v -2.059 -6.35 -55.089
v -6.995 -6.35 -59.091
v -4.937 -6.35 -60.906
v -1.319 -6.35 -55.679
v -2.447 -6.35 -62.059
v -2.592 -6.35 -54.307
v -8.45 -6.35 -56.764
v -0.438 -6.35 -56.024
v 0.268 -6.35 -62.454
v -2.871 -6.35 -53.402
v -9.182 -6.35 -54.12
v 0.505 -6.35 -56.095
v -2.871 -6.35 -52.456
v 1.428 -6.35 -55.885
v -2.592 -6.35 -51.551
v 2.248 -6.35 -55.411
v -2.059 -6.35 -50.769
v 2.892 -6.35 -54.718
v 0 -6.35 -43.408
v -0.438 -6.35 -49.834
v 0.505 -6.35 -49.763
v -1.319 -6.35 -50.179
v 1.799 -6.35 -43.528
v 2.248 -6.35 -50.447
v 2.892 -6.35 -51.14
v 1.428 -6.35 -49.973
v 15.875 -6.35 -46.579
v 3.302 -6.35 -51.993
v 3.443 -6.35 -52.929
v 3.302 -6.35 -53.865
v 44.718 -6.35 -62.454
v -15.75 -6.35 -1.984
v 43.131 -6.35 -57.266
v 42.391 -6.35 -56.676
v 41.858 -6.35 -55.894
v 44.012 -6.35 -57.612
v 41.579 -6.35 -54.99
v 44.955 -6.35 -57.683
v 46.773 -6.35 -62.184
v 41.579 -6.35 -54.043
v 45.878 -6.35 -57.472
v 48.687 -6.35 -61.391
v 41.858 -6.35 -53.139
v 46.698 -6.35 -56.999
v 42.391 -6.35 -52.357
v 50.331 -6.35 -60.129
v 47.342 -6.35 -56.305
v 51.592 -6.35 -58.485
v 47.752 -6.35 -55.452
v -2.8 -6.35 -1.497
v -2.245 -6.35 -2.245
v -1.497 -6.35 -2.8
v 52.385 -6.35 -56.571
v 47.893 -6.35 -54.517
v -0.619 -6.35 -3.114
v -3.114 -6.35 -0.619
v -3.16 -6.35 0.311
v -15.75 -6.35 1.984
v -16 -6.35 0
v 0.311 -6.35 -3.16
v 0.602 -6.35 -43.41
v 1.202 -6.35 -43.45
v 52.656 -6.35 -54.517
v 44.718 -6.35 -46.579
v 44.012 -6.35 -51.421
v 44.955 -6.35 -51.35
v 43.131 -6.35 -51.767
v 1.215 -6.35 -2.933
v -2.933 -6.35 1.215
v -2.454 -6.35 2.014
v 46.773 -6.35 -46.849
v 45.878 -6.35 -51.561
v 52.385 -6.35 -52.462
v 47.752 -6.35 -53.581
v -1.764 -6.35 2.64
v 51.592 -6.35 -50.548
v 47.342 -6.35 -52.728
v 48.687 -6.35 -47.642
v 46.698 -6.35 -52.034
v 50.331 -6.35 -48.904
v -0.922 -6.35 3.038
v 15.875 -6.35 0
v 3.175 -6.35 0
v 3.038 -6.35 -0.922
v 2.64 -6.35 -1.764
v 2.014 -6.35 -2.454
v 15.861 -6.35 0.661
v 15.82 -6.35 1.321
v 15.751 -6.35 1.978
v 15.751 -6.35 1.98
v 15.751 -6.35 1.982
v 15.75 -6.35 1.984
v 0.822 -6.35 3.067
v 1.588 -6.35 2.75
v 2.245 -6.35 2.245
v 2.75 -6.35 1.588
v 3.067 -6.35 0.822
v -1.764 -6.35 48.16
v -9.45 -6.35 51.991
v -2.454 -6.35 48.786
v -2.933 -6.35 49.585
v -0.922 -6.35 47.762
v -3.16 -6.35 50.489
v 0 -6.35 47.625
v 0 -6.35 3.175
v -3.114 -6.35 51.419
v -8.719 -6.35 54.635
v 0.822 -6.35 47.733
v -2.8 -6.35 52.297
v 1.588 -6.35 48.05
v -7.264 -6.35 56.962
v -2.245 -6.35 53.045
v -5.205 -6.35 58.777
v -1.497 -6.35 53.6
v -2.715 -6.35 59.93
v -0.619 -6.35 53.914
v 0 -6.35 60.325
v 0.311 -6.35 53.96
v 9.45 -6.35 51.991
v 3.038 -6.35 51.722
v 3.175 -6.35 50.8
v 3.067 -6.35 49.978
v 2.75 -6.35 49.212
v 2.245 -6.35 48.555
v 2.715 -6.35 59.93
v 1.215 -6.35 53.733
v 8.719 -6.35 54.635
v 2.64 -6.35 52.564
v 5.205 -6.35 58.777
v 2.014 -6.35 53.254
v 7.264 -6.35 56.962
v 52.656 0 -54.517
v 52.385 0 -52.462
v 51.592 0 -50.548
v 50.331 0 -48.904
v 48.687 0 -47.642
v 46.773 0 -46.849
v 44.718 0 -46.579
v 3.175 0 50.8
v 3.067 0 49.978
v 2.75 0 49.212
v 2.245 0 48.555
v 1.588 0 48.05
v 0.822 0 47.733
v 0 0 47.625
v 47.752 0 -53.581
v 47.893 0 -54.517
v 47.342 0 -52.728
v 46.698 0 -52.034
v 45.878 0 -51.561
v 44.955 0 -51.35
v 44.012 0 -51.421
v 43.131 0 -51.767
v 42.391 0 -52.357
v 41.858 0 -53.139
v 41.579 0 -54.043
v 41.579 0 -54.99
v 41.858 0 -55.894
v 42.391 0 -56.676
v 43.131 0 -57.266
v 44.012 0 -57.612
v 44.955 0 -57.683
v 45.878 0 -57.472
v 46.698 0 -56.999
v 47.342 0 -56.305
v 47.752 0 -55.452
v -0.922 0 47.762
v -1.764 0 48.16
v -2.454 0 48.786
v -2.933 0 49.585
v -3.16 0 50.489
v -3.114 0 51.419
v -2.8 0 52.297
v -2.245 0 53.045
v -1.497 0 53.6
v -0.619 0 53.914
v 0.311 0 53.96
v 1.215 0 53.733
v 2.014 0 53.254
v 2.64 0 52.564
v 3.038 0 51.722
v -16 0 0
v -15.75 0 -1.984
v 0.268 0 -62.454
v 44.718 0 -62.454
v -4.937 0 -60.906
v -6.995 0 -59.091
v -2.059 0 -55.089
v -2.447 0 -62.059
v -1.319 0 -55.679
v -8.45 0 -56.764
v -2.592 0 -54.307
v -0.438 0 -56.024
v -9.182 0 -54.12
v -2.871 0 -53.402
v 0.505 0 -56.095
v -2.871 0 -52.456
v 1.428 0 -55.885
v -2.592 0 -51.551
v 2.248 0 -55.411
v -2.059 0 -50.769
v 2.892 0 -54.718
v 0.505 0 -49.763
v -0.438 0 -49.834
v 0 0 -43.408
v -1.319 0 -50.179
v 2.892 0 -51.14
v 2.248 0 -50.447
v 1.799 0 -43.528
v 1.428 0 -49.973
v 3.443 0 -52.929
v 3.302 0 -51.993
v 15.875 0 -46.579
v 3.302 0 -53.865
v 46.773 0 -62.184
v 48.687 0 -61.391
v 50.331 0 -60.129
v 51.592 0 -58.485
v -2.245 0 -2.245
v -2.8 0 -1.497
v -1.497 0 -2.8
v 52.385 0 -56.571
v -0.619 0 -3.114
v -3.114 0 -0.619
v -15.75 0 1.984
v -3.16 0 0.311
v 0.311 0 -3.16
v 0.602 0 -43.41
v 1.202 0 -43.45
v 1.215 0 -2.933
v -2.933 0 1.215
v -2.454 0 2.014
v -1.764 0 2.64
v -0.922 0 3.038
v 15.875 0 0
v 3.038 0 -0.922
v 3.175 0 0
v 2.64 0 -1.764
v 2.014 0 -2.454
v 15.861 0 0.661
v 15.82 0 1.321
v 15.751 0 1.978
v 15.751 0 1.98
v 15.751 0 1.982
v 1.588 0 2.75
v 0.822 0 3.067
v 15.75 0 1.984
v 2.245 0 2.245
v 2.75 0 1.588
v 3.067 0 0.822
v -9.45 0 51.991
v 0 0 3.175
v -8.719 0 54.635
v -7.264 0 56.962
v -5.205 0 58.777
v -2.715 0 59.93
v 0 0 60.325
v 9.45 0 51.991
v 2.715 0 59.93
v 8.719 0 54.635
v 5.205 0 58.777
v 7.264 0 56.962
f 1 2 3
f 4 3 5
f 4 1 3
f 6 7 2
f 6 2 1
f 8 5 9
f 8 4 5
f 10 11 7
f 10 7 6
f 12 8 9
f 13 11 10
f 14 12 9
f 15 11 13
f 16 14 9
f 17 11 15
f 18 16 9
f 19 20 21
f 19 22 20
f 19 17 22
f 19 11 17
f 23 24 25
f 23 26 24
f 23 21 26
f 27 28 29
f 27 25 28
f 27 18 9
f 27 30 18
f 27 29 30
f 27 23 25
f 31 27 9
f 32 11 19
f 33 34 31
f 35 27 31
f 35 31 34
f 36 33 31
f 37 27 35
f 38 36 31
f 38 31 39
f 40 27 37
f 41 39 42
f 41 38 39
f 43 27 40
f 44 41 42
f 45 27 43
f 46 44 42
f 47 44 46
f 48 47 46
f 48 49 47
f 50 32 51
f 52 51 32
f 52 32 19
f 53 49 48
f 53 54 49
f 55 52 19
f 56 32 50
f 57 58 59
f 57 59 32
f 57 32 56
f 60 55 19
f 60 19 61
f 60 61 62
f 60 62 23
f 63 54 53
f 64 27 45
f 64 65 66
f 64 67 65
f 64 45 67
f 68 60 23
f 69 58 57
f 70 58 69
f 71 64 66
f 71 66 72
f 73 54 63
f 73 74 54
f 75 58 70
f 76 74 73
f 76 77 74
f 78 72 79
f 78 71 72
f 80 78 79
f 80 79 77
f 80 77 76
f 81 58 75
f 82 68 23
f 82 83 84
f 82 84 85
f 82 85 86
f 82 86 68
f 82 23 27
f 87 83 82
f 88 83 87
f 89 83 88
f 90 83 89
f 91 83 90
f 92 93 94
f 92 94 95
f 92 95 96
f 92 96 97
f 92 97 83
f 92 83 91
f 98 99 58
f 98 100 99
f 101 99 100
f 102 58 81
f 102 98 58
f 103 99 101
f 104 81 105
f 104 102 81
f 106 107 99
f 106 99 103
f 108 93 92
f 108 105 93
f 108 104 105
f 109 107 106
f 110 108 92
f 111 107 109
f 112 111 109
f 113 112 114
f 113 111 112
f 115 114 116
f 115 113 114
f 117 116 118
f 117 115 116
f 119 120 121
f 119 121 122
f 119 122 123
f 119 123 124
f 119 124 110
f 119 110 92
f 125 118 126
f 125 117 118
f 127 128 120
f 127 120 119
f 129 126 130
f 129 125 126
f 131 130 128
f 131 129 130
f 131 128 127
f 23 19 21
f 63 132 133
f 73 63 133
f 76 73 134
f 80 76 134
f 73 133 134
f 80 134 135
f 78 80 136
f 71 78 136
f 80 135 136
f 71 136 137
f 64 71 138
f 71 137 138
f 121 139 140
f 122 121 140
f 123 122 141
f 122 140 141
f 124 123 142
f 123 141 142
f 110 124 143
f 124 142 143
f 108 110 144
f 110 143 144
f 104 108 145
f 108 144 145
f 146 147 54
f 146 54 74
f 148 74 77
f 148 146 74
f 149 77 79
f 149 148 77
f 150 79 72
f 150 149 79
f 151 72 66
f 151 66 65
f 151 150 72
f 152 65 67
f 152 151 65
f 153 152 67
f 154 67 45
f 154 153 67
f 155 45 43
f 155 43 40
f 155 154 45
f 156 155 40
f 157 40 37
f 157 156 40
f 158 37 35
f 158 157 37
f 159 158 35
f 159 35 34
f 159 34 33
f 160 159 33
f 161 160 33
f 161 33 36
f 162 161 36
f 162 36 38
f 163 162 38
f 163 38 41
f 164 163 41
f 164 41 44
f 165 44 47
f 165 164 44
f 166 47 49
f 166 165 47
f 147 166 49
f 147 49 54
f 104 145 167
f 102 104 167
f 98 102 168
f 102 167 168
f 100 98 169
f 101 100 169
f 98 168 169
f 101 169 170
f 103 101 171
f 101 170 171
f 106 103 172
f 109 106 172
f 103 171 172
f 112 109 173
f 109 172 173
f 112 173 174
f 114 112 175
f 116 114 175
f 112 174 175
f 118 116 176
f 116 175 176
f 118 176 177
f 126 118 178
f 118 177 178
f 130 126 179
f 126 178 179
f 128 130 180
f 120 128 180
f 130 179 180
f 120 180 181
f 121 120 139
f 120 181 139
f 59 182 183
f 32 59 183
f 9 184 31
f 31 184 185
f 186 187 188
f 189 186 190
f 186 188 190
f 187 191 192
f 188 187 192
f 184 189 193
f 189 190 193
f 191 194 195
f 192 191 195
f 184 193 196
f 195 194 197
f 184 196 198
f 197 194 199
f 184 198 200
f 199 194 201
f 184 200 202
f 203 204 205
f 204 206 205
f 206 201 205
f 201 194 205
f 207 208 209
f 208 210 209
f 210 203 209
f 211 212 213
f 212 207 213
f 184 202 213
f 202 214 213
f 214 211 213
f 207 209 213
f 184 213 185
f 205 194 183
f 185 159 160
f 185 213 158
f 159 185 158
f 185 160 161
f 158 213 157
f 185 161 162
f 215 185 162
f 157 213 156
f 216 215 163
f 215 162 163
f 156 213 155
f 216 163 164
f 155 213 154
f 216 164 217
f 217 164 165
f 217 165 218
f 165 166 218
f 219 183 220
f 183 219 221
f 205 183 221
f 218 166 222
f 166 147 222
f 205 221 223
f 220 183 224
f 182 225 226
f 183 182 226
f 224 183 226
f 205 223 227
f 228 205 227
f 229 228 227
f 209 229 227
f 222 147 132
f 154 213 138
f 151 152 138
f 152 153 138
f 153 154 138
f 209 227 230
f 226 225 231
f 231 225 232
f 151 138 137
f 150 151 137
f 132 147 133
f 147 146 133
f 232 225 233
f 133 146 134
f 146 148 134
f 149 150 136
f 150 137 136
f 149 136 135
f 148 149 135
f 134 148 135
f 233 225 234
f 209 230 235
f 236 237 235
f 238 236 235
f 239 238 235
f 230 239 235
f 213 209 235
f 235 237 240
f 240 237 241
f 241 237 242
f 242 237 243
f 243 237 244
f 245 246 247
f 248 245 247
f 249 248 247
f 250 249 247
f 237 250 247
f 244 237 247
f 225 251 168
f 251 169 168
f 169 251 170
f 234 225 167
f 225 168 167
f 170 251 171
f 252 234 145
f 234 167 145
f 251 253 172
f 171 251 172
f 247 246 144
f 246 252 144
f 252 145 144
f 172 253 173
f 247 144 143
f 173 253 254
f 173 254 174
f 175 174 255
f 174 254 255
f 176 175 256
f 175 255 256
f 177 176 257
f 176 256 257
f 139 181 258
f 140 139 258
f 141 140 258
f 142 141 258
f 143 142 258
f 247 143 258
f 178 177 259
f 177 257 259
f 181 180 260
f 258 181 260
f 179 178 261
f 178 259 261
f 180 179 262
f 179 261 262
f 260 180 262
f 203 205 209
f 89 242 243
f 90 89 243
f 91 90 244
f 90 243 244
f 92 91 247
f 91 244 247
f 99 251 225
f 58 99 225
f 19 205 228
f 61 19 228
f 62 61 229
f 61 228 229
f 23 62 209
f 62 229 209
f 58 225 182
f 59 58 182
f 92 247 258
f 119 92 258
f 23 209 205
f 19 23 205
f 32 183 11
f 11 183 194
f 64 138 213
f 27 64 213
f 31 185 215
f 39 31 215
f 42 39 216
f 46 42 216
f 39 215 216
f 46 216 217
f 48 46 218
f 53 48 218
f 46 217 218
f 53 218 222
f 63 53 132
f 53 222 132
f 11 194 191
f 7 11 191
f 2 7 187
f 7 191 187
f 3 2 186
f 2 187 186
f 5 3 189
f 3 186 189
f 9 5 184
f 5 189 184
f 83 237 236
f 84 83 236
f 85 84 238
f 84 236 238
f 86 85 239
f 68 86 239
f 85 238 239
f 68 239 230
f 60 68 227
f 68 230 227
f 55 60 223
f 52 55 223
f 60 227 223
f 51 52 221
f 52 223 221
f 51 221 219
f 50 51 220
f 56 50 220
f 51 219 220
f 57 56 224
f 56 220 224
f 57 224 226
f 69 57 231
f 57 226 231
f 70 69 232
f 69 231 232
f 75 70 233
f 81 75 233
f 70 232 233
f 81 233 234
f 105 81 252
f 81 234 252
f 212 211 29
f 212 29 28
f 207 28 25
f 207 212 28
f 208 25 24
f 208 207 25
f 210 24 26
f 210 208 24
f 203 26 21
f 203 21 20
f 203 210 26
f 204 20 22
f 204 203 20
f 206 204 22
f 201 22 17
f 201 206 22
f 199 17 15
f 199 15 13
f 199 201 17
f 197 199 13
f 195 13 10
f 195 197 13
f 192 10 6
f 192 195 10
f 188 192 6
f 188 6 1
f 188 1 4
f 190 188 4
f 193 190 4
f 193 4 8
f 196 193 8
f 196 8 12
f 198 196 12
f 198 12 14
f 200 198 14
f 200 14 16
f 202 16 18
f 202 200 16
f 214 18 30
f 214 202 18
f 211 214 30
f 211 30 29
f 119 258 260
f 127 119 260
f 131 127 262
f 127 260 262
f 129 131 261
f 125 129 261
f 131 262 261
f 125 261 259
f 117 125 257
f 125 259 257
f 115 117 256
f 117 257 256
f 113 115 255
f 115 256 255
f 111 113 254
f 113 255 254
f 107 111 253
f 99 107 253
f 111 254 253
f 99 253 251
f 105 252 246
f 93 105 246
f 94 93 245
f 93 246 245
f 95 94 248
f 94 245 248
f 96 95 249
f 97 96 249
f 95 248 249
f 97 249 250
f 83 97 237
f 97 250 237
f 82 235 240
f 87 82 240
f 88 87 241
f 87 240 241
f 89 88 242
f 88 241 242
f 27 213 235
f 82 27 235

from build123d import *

# Parameters (mm, degrees)
F0_R     = 3.175
F1_DEPTH = 6.35


# Not quite as in the source:
# - the program builds the solid bodies; features that only make, move or delete a surface that nothing else refers to are left out


with BuildPart() as f1:
    # F0 (on Front) → F1 (new body)
    with BuildSketch(Plane.XZ):
        with BuildLine():
            ThreePointArc((15.7504882737, 1.984375), (10.5003255158, 11.90625), (0, 15.875))
            ThreePointArc((0, 15.875), (-10.500325544, 11.9062499751), (-15.7504882831, 1.9843749253))
            ThreePointArc((-15.7504882831, 1.9843749253), (-15.875, -5.44e-08), (-15.7504882695, -1.9843750333))
            ThreePointArc((-15.7504882695, -1.9843750333), (0.9941387534, -15.8438414893), (15.875, 0))
            ThreePointArc((15.875, 0), (15.8440389276, 0.9909871135), (15.7512764776, 1.9781087752))
            ThreePointArc((15.7512764776, 1.9781087752), (15.7508826872, 1.9812419268), (15.7504882737, 1.984375))
        make_face()
        with BuildLine():
            ThreePointArc((0, 3.175), (2.2450640303, 2.2450640303), (3.175, 0))
            ThreePointArc((3.175, 0), (-2.2450640303, -2.2450640303), (0, 3.175))
        make_face(mode=Mode.SUBTRACT)
        with BuildLine():
            ThreePointArc((-15.7504882831, 1.9843749253), (-10.500325544, 11.9062499751), (0, 15.875))
            Line((0, 15.875), (0, 41.275))
            ThreePointArc((0, 41.275), (-7.14375, 44.4998046905), (-9.4502929642, 51.990625))
            Line((-9.4502929642, 51.990625), (-15.7504882831, 1.9843749253))
        make_face()
        with BuildLine():
            Line((0, 41.275), (0, 15.875))
            ThreePointArc((0, 15.875), (10.5003255158, 11.90625), (15.7504882737, 1.984375))
            Line((15.7504882737, 1.984375), (9.4502929642, 51.990625))
            ThreePointArc((9.4502929642, 51.990625), (9.5063048942, 51.396483242), (9.525, 50.8))
            ThreePointArc((9.525, 50.8), (6.7351920908, 44.0648079092), (0, 41.275))
        make_face()
        with BuildLine():
            ThreePointArc((-15.7504882695, -1.9843750333), (-15.875, -5.44e-08), (-15.7504882831, 1.9843749253))
            Line((-15.7504882831, 1.9843749253), (-16.0004960241, 0))
            Line((-16.0004960241, 0), (-15.7504882695, -1.9843750333))
        make_face()
        with BuildLine():
            ThreePointArc((-9.4502929642, 51.990625), (-7.14375, 44.4998046905), (0, 41.275))
            ThreePointArc((0, 41.275), (6.7351920908, 44.0648079092), (9.525, 50.8))
            ThreePointArc((9.525, 50.8), (9.5063048942, 51.396483242), (9.4502929642, 51.990625))
            ThreePointArc((9.4502929642, 51.990625), (0, 60.325), (-9.4502929642, 51.990625))
        make_face()
        with BuildLine():
            ThreePointArc((3.175, 50.8), (2.2450640303, 48.5549359697), (0, 47.625))
            ThreePointArc((0, 47.625), (-2.2450640303, 53.0450640303), (3.175, 50.8))
        make_face(mode=Mode.SUBTRACT)
        with BuildLine():
            ThreePointArc((15.875, 0), (0.9941387534, -15.8438414893), (-15.7504882695, -1.9843750333))
            Line((-15.7504882695, -1.9843750333), (-9.182062028, -54.1196420534))
            ThreePointArc((-9.182062028, -54.1196420534), (-6.9635285808, -46.7300430021), (0, -43.4077945917))
            ThreePointArc((0, -43.4077945917), (0.9024529842, -43.4251553439), (1.7992106078, -43.5278614731))
            ThreePointArc((1.7992106078, -43.5278614731), (7.5245456473, -46.7588045924), (9.7932309362, -52.9290170534))
            ThreePointArc((9.7932309362, -52.9290170534), (7.003423027, -59.6642091442), (0.2682309362, -62.4540170534))
            Line((0.2682309362, -62.4540170534), (44.7182309362, -62.4540170534))
            ThreePointArc((44.7182309362, -62.4540170534), (36.7807309362, -54.5165170534), (44.7182309362, -46.5790170534))
            Line((44.7182309362, -46.5790170534), (15.875, -46.5790170534))
            Line((15.875, -46.5790170534), (15.875, 0))
        make_face()
        with BuildLine():
            ThreePointArc((0, -43.4077945917), (-6.9635285808, -46.7300430021), (-9.182062028, -54.1196420534))
            ThreePointArc((-9.182062028, -54.1196420534), (-6.0319643733, -60.0727670534), (0.2682309362, -62.4540170534))
            ThreePointArc((0.2682309362, -62.4540170534), (7.003423027, -59.6642091442), (9.7932309362, -52.9290170534))
            ThreePointArc((9.7932309362, -52.9290170534), (7.5245456473, -46.7588045924), (1.7992106078, -43.5278614731))
            Line((1.7992106078, -43.5278614731), (0, -43.4077945917))
        make_face()
        with Locations((0.2682309362, -52.9290170534)):
            Circle(F0_R, mode=Mode.SUBTRACT)
        with BuildLine():
            ThreePointArc((52.6557309362, -54.5165170534), (50.3308910119, -48.9038569777), (44.7182309362, -46.5790170534))
            ThreePointArc((44.7182309362, -46.5790170534), (36.7807309362, -54.5165170534), (44.7182309362, -62.4540170534))
            ThreePointArc((44.7182309362, -62.4540170534), (50.3308910119, -60.1291771291), (52.6557309362, -54.5165170534))
        make_face()
        with Locations((44.7182309362, -54.5165170534)):
            Circle(F0_R, mode=Mode.SUBTRACT)
    extrude(amount=F1_DEPTH)


solid = f1.part
